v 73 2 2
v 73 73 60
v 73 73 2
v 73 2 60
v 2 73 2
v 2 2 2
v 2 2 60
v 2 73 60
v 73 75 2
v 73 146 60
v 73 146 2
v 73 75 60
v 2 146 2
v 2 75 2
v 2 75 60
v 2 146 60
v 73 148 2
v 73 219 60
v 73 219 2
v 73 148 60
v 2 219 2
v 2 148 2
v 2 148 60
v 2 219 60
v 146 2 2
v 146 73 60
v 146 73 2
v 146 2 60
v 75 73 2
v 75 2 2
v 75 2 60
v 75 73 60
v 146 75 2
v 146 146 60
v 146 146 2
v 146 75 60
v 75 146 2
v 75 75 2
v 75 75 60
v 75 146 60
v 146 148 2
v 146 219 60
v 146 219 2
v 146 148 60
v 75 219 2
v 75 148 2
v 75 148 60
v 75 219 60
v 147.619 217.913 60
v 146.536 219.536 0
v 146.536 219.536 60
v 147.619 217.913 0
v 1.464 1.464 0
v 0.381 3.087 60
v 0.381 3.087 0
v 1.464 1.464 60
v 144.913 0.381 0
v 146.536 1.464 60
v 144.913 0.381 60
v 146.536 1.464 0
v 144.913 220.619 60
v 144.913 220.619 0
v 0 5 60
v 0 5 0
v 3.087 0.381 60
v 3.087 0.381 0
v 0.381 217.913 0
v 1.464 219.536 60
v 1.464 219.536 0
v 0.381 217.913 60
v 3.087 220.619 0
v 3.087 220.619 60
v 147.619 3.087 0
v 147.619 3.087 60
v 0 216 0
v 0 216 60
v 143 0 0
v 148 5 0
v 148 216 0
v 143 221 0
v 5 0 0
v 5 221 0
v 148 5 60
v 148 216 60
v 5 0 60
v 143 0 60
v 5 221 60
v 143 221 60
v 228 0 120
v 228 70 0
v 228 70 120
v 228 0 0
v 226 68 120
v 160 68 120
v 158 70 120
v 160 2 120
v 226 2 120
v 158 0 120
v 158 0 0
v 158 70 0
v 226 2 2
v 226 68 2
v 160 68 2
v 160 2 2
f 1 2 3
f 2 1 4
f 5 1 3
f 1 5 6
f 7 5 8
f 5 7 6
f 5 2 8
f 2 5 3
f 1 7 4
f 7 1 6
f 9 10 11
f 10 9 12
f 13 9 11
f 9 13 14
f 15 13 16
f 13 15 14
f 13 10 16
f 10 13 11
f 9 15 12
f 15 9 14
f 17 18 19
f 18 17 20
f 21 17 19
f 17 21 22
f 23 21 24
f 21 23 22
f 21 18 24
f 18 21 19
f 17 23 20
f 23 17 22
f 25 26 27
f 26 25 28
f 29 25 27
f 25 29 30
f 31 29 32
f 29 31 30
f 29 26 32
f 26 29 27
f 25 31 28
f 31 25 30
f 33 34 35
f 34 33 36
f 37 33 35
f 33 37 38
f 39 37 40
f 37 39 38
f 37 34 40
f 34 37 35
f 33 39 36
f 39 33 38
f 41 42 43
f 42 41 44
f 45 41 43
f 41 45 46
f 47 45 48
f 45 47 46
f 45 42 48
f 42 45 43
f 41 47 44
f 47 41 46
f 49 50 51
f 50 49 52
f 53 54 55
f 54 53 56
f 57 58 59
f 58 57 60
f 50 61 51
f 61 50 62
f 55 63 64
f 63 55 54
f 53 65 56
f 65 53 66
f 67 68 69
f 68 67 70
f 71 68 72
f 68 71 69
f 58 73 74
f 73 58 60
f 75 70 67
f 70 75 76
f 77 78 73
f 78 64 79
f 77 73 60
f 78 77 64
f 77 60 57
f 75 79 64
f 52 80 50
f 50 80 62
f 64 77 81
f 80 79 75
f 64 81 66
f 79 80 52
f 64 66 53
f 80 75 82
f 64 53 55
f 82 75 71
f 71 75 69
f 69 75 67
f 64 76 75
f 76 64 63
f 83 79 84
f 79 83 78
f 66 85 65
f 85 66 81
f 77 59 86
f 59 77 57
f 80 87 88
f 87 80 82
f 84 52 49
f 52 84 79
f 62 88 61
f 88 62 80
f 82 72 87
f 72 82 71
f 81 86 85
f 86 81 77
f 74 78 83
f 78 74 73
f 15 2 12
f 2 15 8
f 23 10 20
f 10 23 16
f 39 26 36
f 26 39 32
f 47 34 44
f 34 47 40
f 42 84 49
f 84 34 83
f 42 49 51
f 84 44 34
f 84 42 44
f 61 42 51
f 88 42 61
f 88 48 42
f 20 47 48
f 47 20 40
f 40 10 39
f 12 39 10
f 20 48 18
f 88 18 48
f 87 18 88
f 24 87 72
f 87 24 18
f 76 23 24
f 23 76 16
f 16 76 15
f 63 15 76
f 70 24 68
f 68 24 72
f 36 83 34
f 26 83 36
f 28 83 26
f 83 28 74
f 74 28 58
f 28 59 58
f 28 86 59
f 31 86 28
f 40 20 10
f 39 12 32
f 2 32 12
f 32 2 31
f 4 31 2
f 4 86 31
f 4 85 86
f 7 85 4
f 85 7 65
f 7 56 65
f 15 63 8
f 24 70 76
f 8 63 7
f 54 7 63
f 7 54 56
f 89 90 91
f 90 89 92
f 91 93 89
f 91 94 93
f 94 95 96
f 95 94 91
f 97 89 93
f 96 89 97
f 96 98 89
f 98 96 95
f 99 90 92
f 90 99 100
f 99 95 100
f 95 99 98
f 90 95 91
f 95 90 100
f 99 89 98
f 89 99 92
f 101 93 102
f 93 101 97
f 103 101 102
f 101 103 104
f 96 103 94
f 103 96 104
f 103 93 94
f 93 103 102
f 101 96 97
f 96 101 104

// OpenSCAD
//
// Desk Pen Organizer
//
// This file defines a desk organizer with removable pen/pencil caps.
// The organizer has a grid of compartments, and each compartment can hold one cap.
//

//
// --- Parameters ---
//

// Number of columns and rows for the compartments
cols = 2;
rows = 3;

// Dimensions for the removable caps [width, depth, height]
cap_dims = [70, 70, 120];

// Wall thickness for the organizer and caps
wall_thickness = 2;

// Tolerance for a snug fit of the caps inside the compartments
// This is the extra space around the cap.
tolerance = 1;

// Height of the main organizer base
organizer_height = 60;

// Radius for the outer corners of the organizer
border_radius = 5;


//
// --- Calculated Dimensions ---
// (Usually no need to change these)
//

// Internal dimensions of each compartment
compartment_dims = [
    cap_dims[0] + tolerance, 
    cap_dims[1] + tolerance
];

// Overall dimensions of the organizer
organizer_dims = [
    cols * compartment_dims[0] + (cols + 1) * wall_thickness,
    rows * compartment_dims[1] + (rows + 1) * wall_thickness,
    organizer_height
];


//
// --- Modules ---
//

// Module for the main organizer body
module organizer() {
    difference() {
        // Outer shell of the organizer with rounded corners
        linear_extrude(height = organizer_dims[2]) {
            hull() {
                // Circles at the corners to create the rounded shape
                translate([border_radius, border_radius]) 
                    circle(r = border_radius);
                translate([organizer_dims[0] - border_radius, border_radius]) 
                    circle(r = border_radius);
                translate([border_radius, organizer_dims[1] - border_radius]) 
                    circle(r = border_radius);
                translate([organizer_dims[0] - border_radius, organizer_dims[1] - border_radius]) 
                    circle(r = border_radius);
            }
        }
        
        // Create the cutouts for each compartment
        for (c = [0:cols-1]) {
            for (r = [0:rows-1]) {
                translate([
                    wall_thickness + c * (compartment_dims[0] + wall_thickness),
                    wall_thickness + r * (compartment_dims[1] + wall_thickness),
                    wall_thickness
                ]) {
                    // The cube that creates the hollow space
                    cube([compartment_dims[0], compartment_dims[1], organizer_dims[2]]);
                }
            }
        }
    }
}

// Module for the removable cap/pen holder
module cap() {
    difference() {
        // Outer shape of the cap
        cube(cap_dims);
        
        // Inner hollow part of the cap
        translate([wall_thickness, wall_thickness, wall_thickness]) {
            cube([
                cap_dims[0] - 2 * wall_thickness,
                cap_dims[1] - 2 * wall_thickness,
                cap_dims[2] // Make it slightly taller to ensure it's open at the top
            ]);
        }
    }
}


//
// --- Assembly ---
//
// Uncomment the part you want to render/export.
//

// 1. Render only the organizer
// organizer();

// 2. Render only one cap (for printing separately)
// cap();

// 3. Render the organizer with all caps in place (for visualization)
/*
module assembly() {
    organizer();
    for (c = [0:cols-1]) {
        for (r = [0:rows-1]) {
            translate([
                wall_thickness + c * (compartment_dims[0] + wall_thickness) + tolerance / 2,
                wall_thickness + r * (compartment_dims[1] + wall_thickness) + tolerance / 2,
                wall_thickness
            ]) {
                cap();
            }
        }
    }
}
assembly();
*/

// 4. Render the organizer and one cap side-by-side
organizer();
translate([organizer_dims[0] + 10, 0, 0]) {
    cap();
} 
